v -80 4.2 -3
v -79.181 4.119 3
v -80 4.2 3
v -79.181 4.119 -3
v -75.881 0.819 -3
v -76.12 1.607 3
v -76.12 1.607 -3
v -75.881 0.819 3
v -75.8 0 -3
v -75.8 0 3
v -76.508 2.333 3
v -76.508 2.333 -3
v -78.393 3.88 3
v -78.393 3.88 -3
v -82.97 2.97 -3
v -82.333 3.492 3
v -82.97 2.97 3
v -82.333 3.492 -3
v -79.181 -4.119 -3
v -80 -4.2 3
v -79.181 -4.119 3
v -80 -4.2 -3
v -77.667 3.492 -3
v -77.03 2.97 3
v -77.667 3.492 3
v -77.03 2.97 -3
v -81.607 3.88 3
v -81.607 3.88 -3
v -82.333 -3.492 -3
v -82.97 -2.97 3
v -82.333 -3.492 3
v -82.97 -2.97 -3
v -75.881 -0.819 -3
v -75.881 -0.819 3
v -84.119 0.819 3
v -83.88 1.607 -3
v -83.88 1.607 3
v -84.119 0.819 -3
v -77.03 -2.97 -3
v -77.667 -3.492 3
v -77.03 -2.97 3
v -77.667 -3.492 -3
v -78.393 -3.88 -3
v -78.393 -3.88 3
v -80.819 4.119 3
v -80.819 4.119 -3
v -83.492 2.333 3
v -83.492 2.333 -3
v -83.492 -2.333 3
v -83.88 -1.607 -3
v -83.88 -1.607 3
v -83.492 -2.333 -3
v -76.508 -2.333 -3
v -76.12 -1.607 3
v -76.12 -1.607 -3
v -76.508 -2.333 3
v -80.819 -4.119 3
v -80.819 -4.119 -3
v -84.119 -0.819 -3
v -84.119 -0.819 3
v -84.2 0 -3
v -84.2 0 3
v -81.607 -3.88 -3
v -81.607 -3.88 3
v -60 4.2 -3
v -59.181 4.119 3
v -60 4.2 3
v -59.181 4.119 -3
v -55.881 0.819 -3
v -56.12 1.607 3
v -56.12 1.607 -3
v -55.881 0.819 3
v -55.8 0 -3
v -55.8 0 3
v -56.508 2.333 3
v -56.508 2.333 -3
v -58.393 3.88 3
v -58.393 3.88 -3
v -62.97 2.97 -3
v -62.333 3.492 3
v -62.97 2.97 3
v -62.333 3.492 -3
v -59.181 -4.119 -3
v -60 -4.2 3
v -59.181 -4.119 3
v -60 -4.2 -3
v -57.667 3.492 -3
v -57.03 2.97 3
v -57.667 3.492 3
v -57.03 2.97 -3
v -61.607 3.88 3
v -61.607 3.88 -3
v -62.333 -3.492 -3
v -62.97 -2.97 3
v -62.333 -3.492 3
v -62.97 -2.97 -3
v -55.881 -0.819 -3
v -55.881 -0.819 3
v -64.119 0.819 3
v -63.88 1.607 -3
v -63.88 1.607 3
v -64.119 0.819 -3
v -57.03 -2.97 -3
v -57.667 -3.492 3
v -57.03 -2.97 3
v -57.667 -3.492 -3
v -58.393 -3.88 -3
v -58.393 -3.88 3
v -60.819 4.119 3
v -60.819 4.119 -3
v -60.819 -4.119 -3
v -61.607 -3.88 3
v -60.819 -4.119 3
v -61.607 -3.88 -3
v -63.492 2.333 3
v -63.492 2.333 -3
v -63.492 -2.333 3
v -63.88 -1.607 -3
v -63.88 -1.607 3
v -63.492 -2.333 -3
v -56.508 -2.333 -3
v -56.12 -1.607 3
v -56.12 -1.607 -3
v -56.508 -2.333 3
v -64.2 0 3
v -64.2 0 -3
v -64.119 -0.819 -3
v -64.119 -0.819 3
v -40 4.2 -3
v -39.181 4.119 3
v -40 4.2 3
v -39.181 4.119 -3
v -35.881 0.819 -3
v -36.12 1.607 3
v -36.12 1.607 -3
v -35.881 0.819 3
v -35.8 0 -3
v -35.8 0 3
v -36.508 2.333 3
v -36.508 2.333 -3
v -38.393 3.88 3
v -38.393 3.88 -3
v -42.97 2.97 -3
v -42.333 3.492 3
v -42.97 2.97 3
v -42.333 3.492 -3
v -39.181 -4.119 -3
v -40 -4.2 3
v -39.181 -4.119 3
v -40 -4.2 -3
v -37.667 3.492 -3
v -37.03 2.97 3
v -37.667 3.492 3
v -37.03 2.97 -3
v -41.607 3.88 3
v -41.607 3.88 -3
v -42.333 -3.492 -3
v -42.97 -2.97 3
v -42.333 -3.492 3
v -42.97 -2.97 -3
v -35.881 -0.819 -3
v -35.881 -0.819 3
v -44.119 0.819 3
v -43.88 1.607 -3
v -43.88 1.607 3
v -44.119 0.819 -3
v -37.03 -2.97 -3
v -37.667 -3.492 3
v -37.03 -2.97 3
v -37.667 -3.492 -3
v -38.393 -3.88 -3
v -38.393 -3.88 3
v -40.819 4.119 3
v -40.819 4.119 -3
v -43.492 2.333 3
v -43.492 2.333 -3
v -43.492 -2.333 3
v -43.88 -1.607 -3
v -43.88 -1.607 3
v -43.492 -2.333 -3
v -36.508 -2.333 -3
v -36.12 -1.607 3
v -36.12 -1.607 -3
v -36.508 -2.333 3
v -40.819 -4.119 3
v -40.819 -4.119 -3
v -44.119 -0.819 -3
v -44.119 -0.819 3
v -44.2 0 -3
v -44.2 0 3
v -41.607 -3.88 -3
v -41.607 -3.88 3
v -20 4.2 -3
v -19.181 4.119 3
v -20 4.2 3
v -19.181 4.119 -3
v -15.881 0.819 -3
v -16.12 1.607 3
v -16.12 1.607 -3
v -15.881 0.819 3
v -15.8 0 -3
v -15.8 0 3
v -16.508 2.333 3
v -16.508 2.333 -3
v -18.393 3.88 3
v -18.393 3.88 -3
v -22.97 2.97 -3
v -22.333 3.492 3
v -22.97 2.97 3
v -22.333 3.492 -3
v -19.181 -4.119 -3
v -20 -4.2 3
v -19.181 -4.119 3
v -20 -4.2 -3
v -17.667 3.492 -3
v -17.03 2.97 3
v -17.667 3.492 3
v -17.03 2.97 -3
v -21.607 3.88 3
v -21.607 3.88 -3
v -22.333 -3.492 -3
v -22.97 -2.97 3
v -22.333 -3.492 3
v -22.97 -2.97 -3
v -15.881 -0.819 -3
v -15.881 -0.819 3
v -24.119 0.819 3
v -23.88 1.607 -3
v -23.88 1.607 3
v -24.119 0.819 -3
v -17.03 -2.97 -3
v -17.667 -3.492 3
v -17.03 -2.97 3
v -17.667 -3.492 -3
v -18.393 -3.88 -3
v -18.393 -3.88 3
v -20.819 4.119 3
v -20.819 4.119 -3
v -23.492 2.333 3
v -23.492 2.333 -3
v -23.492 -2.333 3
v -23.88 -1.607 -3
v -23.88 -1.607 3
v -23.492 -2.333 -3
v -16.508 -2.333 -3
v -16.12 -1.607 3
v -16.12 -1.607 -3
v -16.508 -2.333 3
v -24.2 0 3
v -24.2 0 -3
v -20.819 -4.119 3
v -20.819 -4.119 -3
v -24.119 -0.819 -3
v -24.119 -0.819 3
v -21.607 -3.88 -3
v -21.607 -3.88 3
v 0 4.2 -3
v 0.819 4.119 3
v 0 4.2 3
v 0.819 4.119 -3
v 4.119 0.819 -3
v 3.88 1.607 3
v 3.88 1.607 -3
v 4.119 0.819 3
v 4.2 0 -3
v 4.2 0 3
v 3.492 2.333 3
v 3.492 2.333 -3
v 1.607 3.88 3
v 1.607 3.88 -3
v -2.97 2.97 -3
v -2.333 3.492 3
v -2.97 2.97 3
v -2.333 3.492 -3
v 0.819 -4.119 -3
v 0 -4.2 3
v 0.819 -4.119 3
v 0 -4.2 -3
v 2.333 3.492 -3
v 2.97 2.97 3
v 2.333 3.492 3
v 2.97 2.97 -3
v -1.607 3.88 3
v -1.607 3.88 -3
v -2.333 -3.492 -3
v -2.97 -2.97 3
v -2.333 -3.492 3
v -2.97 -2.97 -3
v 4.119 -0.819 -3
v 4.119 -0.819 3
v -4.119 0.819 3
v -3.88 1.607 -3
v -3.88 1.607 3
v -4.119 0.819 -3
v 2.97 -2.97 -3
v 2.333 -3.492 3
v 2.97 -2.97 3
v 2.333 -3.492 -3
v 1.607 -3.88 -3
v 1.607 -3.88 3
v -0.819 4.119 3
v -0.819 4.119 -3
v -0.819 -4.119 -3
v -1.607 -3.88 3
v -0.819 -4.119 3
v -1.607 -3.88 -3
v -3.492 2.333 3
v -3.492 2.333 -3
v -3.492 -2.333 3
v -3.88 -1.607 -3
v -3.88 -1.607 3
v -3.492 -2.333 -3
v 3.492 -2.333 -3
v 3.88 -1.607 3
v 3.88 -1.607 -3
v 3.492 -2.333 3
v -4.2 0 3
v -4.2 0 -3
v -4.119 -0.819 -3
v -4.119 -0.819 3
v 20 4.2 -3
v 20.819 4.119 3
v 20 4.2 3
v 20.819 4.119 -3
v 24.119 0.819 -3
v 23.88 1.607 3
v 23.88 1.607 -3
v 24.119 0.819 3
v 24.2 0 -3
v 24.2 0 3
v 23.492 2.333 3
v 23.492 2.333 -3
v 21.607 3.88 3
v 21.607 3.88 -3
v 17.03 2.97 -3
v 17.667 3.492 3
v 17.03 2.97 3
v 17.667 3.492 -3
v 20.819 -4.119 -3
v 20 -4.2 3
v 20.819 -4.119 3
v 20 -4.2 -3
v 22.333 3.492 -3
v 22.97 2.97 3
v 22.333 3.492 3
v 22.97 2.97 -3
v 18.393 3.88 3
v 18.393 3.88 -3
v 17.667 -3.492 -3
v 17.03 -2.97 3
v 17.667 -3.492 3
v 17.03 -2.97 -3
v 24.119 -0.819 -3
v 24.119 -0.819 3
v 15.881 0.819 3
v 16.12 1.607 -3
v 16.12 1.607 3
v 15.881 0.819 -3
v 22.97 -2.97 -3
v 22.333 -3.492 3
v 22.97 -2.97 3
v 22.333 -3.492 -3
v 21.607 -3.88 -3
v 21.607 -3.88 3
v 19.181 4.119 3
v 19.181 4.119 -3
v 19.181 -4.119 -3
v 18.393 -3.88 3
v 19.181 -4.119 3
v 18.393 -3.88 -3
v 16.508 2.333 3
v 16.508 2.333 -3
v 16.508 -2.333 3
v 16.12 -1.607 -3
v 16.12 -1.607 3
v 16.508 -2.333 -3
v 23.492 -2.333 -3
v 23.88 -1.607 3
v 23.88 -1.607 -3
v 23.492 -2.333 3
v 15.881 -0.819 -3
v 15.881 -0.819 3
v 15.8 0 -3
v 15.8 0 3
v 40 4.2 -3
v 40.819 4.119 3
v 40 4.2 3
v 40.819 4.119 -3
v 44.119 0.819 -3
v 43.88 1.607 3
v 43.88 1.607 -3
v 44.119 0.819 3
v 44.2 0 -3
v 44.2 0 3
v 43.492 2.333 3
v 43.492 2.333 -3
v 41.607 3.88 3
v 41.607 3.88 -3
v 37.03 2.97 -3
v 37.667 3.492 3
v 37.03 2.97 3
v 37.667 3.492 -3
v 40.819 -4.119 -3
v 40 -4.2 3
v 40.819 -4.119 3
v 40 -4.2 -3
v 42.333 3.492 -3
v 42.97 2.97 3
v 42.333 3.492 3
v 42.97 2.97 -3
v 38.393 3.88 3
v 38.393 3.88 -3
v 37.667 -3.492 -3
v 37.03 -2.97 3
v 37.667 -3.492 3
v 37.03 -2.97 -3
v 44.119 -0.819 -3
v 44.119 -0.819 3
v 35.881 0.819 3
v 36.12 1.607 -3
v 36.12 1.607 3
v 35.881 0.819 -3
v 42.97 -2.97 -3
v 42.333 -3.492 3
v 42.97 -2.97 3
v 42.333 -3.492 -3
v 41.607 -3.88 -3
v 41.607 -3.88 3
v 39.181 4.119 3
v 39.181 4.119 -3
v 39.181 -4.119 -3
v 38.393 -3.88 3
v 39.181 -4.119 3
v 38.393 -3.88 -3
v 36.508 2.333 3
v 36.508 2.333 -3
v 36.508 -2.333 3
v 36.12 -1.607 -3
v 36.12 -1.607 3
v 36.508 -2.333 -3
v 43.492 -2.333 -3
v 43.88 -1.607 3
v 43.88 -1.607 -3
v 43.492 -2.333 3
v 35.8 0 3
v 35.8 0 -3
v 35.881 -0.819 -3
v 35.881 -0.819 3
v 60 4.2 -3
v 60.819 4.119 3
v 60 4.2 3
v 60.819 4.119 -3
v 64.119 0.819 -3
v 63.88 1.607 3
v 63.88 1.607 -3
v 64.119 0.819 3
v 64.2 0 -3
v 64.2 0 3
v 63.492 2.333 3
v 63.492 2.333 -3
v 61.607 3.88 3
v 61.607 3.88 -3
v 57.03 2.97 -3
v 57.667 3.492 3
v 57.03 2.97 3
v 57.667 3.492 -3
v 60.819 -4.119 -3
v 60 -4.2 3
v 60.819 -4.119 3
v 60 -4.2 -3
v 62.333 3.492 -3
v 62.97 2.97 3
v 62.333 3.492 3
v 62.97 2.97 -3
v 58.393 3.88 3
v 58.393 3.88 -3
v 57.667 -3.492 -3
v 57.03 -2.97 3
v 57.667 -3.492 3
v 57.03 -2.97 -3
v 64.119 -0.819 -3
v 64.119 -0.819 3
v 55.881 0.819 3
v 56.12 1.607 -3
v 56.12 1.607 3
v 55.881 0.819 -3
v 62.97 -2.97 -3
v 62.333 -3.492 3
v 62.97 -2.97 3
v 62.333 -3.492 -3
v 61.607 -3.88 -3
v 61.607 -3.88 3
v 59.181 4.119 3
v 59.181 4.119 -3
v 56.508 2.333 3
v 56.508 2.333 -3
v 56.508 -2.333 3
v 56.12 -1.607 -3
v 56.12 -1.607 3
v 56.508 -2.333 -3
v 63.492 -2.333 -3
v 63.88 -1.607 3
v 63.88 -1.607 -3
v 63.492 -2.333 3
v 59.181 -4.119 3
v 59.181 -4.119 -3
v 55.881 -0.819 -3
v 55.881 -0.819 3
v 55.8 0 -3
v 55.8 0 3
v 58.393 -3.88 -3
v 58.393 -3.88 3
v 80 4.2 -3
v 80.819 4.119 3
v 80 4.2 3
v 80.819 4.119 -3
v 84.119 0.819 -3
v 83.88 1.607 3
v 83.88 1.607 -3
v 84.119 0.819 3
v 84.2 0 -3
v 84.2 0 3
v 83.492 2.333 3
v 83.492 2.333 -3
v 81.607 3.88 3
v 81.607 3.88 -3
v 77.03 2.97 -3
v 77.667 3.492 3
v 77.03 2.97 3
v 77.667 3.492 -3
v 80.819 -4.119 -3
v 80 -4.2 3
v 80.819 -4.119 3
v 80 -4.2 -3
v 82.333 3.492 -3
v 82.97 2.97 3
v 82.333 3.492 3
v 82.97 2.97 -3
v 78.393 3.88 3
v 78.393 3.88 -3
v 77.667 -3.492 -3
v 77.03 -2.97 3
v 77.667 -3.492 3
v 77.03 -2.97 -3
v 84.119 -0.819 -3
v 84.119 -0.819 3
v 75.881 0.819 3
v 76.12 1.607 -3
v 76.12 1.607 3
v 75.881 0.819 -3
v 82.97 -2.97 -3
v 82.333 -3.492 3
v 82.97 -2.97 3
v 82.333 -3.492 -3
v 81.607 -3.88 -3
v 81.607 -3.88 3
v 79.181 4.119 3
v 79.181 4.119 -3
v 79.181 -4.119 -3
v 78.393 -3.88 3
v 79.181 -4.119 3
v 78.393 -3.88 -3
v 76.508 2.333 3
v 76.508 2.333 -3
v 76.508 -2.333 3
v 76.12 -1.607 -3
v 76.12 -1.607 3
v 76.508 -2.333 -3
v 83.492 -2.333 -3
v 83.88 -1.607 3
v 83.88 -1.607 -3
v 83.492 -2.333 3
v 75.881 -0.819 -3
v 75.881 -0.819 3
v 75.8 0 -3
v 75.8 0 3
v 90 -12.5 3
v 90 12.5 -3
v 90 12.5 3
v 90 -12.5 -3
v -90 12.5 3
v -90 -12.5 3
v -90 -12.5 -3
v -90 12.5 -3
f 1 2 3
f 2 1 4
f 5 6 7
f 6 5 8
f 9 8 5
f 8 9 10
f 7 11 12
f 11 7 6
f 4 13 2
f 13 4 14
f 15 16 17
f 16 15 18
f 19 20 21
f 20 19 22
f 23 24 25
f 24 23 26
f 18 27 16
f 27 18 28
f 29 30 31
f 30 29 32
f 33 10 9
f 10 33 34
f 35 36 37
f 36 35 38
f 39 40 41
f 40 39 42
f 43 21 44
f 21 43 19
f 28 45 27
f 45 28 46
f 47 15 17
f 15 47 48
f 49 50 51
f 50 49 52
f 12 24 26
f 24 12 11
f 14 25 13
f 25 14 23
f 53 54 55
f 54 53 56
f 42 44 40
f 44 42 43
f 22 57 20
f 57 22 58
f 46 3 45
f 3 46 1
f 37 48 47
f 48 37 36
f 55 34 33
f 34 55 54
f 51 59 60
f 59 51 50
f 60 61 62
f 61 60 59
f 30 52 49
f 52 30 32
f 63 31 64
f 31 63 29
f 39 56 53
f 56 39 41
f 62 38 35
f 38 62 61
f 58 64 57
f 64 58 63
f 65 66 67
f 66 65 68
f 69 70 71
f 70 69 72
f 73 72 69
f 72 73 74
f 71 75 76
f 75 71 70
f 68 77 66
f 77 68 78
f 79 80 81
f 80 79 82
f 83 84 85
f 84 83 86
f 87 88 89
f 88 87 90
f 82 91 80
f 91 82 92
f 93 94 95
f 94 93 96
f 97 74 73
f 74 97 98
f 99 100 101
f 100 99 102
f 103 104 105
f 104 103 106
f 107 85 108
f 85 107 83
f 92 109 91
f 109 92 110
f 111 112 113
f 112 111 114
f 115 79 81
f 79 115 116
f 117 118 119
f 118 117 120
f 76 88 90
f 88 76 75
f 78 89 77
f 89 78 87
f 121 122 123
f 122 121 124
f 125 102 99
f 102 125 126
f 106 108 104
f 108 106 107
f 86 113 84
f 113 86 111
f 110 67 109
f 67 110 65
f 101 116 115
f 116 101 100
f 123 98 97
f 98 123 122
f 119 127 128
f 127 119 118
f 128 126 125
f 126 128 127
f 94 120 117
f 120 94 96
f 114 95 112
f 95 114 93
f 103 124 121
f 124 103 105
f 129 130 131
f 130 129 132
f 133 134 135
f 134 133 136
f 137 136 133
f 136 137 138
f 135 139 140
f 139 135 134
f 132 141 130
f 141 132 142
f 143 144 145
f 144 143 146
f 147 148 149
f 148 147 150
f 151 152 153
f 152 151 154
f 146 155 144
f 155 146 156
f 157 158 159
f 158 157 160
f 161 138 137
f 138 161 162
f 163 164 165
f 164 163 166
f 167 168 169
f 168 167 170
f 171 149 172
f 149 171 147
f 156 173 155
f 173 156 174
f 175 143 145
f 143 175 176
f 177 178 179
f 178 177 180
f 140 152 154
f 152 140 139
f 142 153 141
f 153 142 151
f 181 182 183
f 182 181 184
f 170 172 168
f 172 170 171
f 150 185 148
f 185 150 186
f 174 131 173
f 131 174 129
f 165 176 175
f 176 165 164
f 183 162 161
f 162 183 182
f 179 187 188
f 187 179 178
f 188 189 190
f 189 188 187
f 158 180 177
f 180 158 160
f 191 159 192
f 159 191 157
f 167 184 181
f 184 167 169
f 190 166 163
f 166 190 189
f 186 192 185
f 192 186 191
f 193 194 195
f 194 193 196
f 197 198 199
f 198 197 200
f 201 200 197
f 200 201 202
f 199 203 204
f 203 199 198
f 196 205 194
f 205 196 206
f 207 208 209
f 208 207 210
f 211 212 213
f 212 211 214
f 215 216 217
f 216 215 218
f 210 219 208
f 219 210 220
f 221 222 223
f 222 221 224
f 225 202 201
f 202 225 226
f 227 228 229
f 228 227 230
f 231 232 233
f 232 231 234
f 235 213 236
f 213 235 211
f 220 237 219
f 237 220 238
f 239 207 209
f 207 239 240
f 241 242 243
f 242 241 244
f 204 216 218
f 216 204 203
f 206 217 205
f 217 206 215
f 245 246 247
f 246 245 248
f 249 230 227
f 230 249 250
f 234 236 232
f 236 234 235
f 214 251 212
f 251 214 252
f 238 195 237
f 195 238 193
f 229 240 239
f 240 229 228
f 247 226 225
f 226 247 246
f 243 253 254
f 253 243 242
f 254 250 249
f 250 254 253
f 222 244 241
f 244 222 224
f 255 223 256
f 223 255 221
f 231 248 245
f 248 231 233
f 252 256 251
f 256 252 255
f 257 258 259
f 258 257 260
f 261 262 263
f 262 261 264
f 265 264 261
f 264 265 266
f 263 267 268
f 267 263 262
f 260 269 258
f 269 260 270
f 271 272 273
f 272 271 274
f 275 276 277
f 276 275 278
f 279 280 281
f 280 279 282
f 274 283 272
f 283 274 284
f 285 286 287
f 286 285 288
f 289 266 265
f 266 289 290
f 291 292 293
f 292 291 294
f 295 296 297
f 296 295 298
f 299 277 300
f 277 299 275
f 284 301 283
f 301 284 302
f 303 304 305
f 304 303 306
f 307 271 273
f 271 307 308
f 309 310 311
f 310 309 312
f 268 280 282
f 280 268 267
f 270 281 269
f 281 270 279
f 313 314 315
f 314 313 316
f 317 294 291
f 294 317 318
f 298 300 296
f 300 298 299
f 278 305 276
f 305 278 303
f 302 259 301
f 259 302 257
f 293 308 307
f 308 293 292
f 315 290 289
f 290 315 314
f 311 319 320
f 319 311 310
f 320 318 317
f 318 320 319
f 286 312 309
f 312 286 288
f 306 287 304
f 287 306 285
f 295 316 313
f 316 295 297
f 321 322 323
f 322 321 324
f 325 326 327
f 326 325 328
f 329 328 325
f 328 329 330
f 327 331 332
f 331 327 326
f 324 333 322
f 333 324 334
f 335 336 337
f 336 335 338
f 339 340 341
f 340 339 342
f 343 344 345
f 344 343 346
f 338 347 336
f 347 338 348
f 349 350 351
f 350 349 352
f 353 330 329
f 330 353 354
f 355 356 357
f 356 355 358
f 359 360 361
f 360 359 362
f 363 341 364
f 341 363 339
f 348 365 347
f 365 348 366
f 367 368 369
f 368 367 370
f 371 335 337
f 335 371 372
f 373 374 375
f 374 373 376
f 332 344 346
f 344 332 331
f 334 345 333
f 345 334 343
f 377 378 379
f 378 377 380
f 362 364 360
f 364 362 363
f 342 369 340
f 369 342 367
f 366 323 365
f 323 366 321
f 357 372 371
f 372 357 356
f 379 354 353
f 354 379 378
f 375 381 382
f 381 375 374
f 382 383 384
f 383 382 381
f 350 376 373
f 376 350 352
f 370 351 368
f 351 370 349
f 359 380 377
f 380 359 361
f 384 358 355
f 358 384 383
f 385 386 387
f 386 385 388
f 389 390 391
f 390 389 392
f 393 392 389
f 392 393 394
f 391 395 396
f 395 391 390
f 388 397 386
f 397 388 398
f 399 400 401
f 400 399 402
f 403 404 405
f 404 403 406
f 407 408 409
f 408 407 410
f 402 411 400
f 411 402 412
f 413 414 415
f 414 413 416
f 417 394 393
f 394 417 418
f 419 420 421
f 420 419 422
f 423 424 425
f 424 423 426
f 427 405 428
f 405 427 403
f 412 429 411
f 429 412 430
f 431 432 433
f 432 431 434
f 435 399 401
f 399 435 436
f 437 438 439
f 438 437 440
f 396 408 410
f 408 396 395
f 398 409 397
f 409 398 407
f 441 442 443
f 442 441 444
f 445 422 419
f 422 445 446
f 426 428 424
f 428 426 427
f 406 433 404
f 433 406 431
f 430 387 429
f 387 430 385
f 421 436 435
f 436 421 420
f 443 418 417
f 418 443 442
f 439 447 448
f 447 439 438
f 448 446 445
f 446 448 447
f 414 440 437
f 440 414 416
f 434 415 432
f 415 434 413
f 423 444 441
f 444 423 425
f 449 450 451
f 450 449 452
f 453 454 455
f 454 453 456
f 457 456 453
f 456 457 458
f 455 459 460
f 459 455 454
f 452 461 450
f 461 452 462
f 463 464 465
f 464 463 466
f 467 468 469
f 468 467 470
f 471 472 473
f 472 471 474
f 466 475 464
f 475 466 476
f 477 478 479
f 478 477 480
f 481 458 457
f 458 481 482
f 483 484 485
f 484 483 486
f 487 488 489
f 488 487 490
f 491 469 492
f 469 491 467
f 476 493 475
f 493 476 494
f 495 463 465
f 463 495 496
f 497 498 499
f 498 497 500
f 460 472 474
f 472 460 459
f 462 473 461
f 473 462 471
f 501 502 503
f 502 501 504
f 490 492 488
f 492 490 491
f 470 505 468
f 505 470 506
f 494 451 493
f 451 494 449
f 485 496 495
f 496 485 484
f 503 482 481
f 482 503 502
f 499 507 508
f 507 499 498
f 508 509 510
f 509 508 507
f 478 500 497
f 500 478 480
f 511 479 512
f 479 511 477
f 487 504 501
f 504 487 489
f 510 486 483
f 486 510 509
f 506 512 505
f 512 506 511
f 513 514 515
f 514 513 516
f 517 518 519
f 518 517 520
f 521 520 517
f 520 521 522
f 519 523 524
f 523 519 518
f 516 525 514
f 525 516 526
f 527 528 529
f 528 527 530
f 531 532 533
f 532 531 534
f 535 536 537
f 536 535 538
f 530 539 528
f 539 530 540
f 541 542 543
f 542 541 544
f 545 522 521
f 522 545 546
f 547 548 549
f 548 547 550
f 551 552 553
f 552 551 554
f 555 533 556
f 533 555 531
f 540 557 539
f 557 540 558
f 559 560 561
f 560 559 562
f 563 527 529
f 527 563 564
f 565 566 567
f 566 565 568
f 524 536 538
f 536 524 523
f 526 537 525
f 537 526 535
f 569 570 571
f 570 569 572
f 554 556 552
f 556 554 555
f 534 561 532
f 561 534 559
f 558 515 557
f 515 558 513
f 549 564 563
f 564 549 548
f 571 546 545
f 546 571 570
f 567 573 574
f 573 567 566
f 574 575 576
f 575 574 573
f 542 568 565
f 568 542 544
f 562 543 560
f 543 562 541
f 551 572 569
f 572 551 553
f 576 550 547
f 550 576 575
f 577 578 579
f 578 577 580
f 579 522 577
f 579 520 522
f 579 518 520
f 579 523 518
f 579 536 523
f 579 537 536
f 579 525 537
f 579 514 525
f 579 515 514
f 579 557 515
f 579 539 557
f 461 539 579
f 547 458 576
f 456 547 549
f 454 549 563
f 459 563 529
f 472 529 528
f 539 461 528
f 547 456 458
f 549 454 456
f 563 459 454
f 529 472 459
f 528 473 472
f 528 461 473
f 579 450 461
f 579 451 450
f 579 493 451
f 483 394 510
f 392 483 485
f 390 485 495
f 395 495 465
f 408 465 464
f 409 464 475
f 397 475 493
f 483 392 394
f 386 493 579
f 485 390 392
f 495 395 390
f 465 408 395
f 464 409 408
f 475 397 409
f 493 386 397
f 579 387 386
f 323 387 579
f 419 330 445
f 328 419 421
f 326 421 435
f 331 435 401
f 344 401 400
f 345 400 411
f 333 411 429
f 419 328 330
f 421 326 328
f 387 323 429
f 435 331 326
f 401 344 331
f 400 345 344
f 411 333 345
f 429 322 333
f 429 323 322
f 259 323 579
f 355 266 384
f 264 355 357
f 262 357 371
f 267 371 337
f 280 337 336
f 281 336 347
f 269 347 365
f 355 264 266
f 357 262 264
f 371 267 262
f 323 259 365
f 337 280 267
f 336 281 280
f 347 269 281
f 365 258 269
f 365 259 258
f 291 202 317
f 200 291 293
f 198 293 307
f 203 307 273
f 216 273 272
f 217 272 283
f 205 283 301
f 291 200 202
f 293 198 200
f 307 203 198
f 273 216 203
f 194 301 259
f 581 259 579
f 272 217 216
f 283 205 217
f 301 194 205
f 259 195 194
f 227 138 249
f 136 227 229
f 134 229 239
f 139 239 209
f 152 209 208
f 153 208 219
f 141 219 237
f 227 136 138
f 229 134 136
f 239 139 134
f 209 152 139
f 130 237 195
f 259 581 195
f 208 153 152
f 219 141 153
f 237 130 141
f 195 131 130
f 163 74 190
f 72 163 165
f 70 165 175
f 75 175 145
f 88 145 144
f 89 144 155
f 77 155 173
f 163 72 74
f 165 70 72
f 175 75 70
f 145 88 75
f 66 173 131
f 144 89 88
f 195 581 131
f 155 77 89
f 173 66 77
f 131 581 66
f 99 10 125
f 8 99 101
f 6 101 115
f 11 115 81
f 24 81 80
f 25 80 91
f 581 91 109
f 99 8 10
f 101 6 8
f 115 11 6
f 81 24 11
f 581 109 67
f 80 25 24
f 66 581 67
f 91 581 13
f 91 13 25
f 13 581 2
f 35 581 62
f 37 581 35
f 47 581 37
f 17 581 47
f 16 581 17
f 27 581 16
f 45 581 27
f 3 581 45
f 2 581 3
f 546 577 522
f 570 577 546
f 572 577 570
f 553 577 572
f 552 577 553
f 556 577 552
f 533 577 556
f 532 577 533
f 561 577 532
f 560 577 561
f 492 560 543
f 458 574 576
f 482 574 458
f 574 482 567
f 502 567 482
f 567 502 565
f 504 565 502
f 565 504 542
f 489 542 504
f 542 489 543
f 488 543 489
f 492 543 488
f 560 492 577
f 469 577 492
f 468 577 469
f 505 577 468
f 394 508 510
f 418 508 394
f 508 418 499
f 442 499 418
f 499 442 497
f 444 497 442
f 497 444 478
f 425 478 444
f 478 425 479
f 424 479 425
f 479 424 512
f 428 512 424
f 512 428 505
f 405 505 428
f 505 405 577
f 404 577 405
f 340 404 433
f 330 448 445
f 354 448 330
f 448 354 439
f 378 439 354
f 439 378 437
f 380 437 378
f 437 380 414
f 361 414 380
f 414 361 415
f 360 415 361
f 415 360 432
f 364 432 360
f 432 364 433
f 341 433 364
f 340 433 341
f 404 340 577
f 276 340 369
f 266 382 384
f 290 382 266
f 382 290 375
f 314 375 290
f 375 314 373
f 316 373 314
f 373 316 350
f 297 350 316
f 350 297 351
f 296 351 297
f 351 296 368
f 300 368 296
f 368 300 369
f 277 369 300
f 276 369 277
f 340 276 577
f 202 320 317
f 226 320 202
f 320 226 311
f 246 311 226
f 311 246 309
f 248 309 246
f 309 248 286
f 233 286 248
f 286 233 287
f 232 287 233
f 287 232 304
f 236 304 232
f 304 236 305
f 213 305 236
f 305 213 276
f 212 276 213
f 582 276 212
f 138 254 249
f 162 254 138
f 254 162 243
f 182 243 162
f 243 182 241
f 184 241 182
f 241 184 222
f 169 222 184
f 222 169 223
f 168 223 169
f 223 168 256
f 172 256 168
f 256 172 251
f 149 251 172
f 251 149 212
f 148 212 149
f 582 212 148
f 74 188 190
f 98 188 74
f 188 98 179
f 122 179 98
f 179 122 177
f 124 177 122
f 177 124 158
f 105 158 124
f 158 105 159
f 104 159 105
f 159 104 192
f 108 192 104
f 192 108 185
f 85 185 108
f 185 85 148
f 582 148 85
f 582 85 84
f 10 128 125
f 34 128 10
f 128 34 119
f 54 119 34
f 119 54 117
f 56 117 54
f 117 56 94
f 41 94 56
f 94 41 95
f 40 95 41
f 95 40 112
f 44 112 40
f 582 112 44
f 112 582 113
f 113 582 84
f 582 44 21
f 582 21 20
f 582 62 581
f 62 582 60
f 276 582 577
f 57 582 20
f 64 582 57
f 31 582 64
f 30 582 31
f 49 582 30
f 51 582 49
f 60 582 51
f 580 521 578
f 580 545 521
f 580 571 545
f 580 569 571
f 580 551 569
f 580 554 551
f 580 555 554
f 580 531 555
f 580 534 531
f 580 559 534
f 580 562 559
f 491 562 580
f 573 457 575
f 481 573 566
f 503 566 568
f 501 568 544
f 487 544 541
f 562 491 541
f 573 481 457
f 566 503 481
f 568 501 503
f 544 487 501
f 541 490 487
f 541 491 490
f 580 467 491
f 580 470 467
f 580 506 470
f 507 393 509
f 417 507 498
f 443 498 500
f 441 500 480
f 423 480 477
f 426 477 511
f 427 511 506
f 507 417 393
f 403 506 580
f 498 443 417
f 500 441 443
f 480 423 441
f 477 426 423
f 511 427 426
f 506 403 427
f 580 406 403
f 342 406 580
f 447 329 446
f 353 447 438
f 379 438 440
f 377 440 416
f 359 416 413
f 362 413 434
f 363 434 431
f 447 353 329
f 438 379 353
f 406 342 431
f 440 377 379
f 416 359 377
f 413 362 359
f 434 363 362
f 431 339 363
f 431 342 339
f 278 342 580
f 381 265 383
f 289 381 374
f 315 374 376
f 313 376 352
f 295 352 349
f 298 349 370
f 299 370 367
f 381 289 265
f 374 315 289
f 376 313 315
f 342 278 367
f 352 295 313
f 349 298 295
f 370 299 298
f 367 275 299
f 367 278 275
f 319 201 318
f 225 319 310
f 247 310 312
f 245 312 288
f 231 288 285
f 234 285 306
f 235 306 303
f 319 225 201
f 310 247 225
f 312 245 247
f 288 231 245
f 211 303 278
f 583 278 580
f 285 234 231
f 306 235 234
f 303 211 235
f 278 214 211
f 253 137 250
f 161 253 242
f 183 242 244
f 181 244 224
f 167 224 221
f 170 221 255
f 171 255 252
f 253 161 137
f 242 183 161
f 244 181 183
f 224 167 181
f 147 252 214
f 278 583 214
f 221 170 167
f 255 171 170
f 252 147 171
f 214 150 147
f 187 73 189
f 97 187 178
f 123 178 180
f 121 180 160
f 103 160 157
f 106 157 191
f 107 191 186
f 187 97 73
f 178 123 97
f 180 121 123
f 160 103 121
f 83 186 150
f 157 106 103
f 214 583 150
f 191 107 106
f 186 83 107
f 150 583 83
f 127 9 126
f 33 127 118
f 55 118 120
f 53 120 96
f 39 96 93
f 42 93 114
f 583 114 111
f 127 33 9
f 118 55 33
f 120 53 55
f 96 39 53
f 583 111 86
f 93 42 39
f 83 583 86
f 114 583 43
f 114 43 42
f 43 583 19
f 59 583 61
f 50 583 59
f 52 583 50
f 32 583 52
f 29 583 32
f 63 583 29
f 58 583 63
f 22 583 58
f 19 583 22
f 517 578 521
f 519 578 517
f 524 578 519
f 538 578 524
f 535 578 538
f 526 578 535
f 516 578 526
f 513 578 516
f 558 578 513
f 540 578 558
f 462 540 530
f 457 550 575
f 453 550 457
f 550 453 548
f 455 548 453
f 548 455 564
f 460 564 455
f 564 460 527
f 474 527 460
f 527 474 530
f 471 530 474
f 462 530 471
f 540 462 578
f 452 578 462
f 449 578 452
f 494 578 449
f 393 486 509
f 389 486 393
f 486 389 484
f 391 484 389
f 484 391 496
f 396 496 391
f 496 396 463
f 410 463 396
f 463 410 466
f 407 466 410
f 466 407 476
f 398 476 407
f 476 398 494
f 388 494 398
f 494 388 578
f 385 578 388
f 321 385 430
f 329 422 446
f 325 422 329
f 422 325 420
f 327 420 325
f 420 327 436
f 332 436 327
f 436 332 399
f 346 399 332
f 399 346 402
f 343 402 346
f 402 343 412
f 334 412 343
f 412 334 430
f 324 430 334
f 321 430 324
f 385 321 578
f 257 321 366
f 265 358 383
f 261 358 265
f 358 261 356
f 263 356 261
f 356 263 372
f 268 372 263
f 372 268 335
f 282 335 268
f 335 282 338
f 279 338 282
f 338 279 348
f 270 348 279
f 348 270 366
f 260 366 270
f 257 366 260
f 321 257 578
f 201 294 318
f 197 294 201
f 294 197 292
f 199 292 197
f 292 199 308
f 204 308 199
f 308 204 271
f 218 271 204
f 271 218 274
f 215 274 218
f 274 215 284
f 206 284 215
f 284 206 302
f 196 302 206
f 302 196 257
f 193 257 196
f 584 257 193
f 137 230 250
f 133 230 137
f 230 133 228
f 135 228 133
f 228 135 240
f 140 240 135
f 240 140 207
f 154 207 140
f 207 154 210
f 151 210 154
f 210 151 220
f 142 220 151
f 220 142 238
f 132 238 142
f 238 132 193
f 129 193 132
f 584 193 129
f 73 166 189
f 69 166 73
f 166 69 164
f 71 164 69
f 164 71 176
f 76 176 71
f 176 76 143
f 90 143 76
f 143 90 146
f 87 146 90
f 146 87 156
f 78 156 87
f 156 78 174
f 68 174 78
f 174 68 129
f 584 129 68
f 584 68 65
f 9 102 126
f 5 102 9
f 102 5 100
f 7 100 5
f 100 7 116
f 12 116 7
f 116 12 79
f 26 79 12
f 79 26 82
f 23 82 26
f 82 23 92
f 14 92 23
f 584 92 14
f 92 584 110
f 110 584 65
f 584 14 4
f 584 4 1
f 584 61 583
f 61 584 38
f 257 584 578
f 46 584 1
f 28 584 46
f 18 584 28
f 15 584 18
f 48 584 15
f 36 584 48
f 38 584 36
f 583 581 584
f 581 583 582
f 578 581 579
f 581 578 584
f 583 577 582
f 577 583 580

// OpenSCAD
$fn = 32;

// ----------------------------------------------------------------------
// Hole bar, 9 x Ø8.4
// skip layout, 10 mm edge offset
// ----------------------------------------------------------------------

// --- parameters (mm) ---
bar_w = 25;       // bar width (Y)
bar_t = 6;        // bar thickness (Z)
holes = 9;        // holes per row
hole_d = 8.4;     // hole diameter
edge = 10;        // offset from the bar end to the first hole
grid_pitch = 10;  // grid the bar was laid out on

// --- derived feature positions (mm) ---
pitch = grid_pitch * 2;       // = 20   holes sit every other grid slot
span = (holes - 1) * pitch;   // = 160   distance between the end holes
bar_l = span + 2 * edge;      // = 180   overall bar length
start_x = -bar_l / 2 + edge;  // = -80   X of the first hole
feature_centers = [
  [start_x + 0 * pitch, 0],
  [start_x + 1 * pitch, 0],
  [start_x + 2 * pitch, 0],
  [start_x + 3 * pitch, 0],
  [start_x + 4 * pitch, 0],
  [start_x + 5 * pitch, 0],
  [start_x + 6 * pitch, 0],
  [start_x + 7 * pitch, 0],
  [start_x + 8 * pitch, 0]
];   // hole centres of the first row

// bar with one row of holes, drilled from feature_centers
difference() {
  translate([-bar_l / 2, -bar_w / 2, -bar_t / 2]) cube([bar_l, bar_w, bar_t]);
  for (centre = feature_centers)
    translate([centre[0], centre[1], 0])
      cylinder(d = hole_d, h = bar_t + 2, center = true);
}
